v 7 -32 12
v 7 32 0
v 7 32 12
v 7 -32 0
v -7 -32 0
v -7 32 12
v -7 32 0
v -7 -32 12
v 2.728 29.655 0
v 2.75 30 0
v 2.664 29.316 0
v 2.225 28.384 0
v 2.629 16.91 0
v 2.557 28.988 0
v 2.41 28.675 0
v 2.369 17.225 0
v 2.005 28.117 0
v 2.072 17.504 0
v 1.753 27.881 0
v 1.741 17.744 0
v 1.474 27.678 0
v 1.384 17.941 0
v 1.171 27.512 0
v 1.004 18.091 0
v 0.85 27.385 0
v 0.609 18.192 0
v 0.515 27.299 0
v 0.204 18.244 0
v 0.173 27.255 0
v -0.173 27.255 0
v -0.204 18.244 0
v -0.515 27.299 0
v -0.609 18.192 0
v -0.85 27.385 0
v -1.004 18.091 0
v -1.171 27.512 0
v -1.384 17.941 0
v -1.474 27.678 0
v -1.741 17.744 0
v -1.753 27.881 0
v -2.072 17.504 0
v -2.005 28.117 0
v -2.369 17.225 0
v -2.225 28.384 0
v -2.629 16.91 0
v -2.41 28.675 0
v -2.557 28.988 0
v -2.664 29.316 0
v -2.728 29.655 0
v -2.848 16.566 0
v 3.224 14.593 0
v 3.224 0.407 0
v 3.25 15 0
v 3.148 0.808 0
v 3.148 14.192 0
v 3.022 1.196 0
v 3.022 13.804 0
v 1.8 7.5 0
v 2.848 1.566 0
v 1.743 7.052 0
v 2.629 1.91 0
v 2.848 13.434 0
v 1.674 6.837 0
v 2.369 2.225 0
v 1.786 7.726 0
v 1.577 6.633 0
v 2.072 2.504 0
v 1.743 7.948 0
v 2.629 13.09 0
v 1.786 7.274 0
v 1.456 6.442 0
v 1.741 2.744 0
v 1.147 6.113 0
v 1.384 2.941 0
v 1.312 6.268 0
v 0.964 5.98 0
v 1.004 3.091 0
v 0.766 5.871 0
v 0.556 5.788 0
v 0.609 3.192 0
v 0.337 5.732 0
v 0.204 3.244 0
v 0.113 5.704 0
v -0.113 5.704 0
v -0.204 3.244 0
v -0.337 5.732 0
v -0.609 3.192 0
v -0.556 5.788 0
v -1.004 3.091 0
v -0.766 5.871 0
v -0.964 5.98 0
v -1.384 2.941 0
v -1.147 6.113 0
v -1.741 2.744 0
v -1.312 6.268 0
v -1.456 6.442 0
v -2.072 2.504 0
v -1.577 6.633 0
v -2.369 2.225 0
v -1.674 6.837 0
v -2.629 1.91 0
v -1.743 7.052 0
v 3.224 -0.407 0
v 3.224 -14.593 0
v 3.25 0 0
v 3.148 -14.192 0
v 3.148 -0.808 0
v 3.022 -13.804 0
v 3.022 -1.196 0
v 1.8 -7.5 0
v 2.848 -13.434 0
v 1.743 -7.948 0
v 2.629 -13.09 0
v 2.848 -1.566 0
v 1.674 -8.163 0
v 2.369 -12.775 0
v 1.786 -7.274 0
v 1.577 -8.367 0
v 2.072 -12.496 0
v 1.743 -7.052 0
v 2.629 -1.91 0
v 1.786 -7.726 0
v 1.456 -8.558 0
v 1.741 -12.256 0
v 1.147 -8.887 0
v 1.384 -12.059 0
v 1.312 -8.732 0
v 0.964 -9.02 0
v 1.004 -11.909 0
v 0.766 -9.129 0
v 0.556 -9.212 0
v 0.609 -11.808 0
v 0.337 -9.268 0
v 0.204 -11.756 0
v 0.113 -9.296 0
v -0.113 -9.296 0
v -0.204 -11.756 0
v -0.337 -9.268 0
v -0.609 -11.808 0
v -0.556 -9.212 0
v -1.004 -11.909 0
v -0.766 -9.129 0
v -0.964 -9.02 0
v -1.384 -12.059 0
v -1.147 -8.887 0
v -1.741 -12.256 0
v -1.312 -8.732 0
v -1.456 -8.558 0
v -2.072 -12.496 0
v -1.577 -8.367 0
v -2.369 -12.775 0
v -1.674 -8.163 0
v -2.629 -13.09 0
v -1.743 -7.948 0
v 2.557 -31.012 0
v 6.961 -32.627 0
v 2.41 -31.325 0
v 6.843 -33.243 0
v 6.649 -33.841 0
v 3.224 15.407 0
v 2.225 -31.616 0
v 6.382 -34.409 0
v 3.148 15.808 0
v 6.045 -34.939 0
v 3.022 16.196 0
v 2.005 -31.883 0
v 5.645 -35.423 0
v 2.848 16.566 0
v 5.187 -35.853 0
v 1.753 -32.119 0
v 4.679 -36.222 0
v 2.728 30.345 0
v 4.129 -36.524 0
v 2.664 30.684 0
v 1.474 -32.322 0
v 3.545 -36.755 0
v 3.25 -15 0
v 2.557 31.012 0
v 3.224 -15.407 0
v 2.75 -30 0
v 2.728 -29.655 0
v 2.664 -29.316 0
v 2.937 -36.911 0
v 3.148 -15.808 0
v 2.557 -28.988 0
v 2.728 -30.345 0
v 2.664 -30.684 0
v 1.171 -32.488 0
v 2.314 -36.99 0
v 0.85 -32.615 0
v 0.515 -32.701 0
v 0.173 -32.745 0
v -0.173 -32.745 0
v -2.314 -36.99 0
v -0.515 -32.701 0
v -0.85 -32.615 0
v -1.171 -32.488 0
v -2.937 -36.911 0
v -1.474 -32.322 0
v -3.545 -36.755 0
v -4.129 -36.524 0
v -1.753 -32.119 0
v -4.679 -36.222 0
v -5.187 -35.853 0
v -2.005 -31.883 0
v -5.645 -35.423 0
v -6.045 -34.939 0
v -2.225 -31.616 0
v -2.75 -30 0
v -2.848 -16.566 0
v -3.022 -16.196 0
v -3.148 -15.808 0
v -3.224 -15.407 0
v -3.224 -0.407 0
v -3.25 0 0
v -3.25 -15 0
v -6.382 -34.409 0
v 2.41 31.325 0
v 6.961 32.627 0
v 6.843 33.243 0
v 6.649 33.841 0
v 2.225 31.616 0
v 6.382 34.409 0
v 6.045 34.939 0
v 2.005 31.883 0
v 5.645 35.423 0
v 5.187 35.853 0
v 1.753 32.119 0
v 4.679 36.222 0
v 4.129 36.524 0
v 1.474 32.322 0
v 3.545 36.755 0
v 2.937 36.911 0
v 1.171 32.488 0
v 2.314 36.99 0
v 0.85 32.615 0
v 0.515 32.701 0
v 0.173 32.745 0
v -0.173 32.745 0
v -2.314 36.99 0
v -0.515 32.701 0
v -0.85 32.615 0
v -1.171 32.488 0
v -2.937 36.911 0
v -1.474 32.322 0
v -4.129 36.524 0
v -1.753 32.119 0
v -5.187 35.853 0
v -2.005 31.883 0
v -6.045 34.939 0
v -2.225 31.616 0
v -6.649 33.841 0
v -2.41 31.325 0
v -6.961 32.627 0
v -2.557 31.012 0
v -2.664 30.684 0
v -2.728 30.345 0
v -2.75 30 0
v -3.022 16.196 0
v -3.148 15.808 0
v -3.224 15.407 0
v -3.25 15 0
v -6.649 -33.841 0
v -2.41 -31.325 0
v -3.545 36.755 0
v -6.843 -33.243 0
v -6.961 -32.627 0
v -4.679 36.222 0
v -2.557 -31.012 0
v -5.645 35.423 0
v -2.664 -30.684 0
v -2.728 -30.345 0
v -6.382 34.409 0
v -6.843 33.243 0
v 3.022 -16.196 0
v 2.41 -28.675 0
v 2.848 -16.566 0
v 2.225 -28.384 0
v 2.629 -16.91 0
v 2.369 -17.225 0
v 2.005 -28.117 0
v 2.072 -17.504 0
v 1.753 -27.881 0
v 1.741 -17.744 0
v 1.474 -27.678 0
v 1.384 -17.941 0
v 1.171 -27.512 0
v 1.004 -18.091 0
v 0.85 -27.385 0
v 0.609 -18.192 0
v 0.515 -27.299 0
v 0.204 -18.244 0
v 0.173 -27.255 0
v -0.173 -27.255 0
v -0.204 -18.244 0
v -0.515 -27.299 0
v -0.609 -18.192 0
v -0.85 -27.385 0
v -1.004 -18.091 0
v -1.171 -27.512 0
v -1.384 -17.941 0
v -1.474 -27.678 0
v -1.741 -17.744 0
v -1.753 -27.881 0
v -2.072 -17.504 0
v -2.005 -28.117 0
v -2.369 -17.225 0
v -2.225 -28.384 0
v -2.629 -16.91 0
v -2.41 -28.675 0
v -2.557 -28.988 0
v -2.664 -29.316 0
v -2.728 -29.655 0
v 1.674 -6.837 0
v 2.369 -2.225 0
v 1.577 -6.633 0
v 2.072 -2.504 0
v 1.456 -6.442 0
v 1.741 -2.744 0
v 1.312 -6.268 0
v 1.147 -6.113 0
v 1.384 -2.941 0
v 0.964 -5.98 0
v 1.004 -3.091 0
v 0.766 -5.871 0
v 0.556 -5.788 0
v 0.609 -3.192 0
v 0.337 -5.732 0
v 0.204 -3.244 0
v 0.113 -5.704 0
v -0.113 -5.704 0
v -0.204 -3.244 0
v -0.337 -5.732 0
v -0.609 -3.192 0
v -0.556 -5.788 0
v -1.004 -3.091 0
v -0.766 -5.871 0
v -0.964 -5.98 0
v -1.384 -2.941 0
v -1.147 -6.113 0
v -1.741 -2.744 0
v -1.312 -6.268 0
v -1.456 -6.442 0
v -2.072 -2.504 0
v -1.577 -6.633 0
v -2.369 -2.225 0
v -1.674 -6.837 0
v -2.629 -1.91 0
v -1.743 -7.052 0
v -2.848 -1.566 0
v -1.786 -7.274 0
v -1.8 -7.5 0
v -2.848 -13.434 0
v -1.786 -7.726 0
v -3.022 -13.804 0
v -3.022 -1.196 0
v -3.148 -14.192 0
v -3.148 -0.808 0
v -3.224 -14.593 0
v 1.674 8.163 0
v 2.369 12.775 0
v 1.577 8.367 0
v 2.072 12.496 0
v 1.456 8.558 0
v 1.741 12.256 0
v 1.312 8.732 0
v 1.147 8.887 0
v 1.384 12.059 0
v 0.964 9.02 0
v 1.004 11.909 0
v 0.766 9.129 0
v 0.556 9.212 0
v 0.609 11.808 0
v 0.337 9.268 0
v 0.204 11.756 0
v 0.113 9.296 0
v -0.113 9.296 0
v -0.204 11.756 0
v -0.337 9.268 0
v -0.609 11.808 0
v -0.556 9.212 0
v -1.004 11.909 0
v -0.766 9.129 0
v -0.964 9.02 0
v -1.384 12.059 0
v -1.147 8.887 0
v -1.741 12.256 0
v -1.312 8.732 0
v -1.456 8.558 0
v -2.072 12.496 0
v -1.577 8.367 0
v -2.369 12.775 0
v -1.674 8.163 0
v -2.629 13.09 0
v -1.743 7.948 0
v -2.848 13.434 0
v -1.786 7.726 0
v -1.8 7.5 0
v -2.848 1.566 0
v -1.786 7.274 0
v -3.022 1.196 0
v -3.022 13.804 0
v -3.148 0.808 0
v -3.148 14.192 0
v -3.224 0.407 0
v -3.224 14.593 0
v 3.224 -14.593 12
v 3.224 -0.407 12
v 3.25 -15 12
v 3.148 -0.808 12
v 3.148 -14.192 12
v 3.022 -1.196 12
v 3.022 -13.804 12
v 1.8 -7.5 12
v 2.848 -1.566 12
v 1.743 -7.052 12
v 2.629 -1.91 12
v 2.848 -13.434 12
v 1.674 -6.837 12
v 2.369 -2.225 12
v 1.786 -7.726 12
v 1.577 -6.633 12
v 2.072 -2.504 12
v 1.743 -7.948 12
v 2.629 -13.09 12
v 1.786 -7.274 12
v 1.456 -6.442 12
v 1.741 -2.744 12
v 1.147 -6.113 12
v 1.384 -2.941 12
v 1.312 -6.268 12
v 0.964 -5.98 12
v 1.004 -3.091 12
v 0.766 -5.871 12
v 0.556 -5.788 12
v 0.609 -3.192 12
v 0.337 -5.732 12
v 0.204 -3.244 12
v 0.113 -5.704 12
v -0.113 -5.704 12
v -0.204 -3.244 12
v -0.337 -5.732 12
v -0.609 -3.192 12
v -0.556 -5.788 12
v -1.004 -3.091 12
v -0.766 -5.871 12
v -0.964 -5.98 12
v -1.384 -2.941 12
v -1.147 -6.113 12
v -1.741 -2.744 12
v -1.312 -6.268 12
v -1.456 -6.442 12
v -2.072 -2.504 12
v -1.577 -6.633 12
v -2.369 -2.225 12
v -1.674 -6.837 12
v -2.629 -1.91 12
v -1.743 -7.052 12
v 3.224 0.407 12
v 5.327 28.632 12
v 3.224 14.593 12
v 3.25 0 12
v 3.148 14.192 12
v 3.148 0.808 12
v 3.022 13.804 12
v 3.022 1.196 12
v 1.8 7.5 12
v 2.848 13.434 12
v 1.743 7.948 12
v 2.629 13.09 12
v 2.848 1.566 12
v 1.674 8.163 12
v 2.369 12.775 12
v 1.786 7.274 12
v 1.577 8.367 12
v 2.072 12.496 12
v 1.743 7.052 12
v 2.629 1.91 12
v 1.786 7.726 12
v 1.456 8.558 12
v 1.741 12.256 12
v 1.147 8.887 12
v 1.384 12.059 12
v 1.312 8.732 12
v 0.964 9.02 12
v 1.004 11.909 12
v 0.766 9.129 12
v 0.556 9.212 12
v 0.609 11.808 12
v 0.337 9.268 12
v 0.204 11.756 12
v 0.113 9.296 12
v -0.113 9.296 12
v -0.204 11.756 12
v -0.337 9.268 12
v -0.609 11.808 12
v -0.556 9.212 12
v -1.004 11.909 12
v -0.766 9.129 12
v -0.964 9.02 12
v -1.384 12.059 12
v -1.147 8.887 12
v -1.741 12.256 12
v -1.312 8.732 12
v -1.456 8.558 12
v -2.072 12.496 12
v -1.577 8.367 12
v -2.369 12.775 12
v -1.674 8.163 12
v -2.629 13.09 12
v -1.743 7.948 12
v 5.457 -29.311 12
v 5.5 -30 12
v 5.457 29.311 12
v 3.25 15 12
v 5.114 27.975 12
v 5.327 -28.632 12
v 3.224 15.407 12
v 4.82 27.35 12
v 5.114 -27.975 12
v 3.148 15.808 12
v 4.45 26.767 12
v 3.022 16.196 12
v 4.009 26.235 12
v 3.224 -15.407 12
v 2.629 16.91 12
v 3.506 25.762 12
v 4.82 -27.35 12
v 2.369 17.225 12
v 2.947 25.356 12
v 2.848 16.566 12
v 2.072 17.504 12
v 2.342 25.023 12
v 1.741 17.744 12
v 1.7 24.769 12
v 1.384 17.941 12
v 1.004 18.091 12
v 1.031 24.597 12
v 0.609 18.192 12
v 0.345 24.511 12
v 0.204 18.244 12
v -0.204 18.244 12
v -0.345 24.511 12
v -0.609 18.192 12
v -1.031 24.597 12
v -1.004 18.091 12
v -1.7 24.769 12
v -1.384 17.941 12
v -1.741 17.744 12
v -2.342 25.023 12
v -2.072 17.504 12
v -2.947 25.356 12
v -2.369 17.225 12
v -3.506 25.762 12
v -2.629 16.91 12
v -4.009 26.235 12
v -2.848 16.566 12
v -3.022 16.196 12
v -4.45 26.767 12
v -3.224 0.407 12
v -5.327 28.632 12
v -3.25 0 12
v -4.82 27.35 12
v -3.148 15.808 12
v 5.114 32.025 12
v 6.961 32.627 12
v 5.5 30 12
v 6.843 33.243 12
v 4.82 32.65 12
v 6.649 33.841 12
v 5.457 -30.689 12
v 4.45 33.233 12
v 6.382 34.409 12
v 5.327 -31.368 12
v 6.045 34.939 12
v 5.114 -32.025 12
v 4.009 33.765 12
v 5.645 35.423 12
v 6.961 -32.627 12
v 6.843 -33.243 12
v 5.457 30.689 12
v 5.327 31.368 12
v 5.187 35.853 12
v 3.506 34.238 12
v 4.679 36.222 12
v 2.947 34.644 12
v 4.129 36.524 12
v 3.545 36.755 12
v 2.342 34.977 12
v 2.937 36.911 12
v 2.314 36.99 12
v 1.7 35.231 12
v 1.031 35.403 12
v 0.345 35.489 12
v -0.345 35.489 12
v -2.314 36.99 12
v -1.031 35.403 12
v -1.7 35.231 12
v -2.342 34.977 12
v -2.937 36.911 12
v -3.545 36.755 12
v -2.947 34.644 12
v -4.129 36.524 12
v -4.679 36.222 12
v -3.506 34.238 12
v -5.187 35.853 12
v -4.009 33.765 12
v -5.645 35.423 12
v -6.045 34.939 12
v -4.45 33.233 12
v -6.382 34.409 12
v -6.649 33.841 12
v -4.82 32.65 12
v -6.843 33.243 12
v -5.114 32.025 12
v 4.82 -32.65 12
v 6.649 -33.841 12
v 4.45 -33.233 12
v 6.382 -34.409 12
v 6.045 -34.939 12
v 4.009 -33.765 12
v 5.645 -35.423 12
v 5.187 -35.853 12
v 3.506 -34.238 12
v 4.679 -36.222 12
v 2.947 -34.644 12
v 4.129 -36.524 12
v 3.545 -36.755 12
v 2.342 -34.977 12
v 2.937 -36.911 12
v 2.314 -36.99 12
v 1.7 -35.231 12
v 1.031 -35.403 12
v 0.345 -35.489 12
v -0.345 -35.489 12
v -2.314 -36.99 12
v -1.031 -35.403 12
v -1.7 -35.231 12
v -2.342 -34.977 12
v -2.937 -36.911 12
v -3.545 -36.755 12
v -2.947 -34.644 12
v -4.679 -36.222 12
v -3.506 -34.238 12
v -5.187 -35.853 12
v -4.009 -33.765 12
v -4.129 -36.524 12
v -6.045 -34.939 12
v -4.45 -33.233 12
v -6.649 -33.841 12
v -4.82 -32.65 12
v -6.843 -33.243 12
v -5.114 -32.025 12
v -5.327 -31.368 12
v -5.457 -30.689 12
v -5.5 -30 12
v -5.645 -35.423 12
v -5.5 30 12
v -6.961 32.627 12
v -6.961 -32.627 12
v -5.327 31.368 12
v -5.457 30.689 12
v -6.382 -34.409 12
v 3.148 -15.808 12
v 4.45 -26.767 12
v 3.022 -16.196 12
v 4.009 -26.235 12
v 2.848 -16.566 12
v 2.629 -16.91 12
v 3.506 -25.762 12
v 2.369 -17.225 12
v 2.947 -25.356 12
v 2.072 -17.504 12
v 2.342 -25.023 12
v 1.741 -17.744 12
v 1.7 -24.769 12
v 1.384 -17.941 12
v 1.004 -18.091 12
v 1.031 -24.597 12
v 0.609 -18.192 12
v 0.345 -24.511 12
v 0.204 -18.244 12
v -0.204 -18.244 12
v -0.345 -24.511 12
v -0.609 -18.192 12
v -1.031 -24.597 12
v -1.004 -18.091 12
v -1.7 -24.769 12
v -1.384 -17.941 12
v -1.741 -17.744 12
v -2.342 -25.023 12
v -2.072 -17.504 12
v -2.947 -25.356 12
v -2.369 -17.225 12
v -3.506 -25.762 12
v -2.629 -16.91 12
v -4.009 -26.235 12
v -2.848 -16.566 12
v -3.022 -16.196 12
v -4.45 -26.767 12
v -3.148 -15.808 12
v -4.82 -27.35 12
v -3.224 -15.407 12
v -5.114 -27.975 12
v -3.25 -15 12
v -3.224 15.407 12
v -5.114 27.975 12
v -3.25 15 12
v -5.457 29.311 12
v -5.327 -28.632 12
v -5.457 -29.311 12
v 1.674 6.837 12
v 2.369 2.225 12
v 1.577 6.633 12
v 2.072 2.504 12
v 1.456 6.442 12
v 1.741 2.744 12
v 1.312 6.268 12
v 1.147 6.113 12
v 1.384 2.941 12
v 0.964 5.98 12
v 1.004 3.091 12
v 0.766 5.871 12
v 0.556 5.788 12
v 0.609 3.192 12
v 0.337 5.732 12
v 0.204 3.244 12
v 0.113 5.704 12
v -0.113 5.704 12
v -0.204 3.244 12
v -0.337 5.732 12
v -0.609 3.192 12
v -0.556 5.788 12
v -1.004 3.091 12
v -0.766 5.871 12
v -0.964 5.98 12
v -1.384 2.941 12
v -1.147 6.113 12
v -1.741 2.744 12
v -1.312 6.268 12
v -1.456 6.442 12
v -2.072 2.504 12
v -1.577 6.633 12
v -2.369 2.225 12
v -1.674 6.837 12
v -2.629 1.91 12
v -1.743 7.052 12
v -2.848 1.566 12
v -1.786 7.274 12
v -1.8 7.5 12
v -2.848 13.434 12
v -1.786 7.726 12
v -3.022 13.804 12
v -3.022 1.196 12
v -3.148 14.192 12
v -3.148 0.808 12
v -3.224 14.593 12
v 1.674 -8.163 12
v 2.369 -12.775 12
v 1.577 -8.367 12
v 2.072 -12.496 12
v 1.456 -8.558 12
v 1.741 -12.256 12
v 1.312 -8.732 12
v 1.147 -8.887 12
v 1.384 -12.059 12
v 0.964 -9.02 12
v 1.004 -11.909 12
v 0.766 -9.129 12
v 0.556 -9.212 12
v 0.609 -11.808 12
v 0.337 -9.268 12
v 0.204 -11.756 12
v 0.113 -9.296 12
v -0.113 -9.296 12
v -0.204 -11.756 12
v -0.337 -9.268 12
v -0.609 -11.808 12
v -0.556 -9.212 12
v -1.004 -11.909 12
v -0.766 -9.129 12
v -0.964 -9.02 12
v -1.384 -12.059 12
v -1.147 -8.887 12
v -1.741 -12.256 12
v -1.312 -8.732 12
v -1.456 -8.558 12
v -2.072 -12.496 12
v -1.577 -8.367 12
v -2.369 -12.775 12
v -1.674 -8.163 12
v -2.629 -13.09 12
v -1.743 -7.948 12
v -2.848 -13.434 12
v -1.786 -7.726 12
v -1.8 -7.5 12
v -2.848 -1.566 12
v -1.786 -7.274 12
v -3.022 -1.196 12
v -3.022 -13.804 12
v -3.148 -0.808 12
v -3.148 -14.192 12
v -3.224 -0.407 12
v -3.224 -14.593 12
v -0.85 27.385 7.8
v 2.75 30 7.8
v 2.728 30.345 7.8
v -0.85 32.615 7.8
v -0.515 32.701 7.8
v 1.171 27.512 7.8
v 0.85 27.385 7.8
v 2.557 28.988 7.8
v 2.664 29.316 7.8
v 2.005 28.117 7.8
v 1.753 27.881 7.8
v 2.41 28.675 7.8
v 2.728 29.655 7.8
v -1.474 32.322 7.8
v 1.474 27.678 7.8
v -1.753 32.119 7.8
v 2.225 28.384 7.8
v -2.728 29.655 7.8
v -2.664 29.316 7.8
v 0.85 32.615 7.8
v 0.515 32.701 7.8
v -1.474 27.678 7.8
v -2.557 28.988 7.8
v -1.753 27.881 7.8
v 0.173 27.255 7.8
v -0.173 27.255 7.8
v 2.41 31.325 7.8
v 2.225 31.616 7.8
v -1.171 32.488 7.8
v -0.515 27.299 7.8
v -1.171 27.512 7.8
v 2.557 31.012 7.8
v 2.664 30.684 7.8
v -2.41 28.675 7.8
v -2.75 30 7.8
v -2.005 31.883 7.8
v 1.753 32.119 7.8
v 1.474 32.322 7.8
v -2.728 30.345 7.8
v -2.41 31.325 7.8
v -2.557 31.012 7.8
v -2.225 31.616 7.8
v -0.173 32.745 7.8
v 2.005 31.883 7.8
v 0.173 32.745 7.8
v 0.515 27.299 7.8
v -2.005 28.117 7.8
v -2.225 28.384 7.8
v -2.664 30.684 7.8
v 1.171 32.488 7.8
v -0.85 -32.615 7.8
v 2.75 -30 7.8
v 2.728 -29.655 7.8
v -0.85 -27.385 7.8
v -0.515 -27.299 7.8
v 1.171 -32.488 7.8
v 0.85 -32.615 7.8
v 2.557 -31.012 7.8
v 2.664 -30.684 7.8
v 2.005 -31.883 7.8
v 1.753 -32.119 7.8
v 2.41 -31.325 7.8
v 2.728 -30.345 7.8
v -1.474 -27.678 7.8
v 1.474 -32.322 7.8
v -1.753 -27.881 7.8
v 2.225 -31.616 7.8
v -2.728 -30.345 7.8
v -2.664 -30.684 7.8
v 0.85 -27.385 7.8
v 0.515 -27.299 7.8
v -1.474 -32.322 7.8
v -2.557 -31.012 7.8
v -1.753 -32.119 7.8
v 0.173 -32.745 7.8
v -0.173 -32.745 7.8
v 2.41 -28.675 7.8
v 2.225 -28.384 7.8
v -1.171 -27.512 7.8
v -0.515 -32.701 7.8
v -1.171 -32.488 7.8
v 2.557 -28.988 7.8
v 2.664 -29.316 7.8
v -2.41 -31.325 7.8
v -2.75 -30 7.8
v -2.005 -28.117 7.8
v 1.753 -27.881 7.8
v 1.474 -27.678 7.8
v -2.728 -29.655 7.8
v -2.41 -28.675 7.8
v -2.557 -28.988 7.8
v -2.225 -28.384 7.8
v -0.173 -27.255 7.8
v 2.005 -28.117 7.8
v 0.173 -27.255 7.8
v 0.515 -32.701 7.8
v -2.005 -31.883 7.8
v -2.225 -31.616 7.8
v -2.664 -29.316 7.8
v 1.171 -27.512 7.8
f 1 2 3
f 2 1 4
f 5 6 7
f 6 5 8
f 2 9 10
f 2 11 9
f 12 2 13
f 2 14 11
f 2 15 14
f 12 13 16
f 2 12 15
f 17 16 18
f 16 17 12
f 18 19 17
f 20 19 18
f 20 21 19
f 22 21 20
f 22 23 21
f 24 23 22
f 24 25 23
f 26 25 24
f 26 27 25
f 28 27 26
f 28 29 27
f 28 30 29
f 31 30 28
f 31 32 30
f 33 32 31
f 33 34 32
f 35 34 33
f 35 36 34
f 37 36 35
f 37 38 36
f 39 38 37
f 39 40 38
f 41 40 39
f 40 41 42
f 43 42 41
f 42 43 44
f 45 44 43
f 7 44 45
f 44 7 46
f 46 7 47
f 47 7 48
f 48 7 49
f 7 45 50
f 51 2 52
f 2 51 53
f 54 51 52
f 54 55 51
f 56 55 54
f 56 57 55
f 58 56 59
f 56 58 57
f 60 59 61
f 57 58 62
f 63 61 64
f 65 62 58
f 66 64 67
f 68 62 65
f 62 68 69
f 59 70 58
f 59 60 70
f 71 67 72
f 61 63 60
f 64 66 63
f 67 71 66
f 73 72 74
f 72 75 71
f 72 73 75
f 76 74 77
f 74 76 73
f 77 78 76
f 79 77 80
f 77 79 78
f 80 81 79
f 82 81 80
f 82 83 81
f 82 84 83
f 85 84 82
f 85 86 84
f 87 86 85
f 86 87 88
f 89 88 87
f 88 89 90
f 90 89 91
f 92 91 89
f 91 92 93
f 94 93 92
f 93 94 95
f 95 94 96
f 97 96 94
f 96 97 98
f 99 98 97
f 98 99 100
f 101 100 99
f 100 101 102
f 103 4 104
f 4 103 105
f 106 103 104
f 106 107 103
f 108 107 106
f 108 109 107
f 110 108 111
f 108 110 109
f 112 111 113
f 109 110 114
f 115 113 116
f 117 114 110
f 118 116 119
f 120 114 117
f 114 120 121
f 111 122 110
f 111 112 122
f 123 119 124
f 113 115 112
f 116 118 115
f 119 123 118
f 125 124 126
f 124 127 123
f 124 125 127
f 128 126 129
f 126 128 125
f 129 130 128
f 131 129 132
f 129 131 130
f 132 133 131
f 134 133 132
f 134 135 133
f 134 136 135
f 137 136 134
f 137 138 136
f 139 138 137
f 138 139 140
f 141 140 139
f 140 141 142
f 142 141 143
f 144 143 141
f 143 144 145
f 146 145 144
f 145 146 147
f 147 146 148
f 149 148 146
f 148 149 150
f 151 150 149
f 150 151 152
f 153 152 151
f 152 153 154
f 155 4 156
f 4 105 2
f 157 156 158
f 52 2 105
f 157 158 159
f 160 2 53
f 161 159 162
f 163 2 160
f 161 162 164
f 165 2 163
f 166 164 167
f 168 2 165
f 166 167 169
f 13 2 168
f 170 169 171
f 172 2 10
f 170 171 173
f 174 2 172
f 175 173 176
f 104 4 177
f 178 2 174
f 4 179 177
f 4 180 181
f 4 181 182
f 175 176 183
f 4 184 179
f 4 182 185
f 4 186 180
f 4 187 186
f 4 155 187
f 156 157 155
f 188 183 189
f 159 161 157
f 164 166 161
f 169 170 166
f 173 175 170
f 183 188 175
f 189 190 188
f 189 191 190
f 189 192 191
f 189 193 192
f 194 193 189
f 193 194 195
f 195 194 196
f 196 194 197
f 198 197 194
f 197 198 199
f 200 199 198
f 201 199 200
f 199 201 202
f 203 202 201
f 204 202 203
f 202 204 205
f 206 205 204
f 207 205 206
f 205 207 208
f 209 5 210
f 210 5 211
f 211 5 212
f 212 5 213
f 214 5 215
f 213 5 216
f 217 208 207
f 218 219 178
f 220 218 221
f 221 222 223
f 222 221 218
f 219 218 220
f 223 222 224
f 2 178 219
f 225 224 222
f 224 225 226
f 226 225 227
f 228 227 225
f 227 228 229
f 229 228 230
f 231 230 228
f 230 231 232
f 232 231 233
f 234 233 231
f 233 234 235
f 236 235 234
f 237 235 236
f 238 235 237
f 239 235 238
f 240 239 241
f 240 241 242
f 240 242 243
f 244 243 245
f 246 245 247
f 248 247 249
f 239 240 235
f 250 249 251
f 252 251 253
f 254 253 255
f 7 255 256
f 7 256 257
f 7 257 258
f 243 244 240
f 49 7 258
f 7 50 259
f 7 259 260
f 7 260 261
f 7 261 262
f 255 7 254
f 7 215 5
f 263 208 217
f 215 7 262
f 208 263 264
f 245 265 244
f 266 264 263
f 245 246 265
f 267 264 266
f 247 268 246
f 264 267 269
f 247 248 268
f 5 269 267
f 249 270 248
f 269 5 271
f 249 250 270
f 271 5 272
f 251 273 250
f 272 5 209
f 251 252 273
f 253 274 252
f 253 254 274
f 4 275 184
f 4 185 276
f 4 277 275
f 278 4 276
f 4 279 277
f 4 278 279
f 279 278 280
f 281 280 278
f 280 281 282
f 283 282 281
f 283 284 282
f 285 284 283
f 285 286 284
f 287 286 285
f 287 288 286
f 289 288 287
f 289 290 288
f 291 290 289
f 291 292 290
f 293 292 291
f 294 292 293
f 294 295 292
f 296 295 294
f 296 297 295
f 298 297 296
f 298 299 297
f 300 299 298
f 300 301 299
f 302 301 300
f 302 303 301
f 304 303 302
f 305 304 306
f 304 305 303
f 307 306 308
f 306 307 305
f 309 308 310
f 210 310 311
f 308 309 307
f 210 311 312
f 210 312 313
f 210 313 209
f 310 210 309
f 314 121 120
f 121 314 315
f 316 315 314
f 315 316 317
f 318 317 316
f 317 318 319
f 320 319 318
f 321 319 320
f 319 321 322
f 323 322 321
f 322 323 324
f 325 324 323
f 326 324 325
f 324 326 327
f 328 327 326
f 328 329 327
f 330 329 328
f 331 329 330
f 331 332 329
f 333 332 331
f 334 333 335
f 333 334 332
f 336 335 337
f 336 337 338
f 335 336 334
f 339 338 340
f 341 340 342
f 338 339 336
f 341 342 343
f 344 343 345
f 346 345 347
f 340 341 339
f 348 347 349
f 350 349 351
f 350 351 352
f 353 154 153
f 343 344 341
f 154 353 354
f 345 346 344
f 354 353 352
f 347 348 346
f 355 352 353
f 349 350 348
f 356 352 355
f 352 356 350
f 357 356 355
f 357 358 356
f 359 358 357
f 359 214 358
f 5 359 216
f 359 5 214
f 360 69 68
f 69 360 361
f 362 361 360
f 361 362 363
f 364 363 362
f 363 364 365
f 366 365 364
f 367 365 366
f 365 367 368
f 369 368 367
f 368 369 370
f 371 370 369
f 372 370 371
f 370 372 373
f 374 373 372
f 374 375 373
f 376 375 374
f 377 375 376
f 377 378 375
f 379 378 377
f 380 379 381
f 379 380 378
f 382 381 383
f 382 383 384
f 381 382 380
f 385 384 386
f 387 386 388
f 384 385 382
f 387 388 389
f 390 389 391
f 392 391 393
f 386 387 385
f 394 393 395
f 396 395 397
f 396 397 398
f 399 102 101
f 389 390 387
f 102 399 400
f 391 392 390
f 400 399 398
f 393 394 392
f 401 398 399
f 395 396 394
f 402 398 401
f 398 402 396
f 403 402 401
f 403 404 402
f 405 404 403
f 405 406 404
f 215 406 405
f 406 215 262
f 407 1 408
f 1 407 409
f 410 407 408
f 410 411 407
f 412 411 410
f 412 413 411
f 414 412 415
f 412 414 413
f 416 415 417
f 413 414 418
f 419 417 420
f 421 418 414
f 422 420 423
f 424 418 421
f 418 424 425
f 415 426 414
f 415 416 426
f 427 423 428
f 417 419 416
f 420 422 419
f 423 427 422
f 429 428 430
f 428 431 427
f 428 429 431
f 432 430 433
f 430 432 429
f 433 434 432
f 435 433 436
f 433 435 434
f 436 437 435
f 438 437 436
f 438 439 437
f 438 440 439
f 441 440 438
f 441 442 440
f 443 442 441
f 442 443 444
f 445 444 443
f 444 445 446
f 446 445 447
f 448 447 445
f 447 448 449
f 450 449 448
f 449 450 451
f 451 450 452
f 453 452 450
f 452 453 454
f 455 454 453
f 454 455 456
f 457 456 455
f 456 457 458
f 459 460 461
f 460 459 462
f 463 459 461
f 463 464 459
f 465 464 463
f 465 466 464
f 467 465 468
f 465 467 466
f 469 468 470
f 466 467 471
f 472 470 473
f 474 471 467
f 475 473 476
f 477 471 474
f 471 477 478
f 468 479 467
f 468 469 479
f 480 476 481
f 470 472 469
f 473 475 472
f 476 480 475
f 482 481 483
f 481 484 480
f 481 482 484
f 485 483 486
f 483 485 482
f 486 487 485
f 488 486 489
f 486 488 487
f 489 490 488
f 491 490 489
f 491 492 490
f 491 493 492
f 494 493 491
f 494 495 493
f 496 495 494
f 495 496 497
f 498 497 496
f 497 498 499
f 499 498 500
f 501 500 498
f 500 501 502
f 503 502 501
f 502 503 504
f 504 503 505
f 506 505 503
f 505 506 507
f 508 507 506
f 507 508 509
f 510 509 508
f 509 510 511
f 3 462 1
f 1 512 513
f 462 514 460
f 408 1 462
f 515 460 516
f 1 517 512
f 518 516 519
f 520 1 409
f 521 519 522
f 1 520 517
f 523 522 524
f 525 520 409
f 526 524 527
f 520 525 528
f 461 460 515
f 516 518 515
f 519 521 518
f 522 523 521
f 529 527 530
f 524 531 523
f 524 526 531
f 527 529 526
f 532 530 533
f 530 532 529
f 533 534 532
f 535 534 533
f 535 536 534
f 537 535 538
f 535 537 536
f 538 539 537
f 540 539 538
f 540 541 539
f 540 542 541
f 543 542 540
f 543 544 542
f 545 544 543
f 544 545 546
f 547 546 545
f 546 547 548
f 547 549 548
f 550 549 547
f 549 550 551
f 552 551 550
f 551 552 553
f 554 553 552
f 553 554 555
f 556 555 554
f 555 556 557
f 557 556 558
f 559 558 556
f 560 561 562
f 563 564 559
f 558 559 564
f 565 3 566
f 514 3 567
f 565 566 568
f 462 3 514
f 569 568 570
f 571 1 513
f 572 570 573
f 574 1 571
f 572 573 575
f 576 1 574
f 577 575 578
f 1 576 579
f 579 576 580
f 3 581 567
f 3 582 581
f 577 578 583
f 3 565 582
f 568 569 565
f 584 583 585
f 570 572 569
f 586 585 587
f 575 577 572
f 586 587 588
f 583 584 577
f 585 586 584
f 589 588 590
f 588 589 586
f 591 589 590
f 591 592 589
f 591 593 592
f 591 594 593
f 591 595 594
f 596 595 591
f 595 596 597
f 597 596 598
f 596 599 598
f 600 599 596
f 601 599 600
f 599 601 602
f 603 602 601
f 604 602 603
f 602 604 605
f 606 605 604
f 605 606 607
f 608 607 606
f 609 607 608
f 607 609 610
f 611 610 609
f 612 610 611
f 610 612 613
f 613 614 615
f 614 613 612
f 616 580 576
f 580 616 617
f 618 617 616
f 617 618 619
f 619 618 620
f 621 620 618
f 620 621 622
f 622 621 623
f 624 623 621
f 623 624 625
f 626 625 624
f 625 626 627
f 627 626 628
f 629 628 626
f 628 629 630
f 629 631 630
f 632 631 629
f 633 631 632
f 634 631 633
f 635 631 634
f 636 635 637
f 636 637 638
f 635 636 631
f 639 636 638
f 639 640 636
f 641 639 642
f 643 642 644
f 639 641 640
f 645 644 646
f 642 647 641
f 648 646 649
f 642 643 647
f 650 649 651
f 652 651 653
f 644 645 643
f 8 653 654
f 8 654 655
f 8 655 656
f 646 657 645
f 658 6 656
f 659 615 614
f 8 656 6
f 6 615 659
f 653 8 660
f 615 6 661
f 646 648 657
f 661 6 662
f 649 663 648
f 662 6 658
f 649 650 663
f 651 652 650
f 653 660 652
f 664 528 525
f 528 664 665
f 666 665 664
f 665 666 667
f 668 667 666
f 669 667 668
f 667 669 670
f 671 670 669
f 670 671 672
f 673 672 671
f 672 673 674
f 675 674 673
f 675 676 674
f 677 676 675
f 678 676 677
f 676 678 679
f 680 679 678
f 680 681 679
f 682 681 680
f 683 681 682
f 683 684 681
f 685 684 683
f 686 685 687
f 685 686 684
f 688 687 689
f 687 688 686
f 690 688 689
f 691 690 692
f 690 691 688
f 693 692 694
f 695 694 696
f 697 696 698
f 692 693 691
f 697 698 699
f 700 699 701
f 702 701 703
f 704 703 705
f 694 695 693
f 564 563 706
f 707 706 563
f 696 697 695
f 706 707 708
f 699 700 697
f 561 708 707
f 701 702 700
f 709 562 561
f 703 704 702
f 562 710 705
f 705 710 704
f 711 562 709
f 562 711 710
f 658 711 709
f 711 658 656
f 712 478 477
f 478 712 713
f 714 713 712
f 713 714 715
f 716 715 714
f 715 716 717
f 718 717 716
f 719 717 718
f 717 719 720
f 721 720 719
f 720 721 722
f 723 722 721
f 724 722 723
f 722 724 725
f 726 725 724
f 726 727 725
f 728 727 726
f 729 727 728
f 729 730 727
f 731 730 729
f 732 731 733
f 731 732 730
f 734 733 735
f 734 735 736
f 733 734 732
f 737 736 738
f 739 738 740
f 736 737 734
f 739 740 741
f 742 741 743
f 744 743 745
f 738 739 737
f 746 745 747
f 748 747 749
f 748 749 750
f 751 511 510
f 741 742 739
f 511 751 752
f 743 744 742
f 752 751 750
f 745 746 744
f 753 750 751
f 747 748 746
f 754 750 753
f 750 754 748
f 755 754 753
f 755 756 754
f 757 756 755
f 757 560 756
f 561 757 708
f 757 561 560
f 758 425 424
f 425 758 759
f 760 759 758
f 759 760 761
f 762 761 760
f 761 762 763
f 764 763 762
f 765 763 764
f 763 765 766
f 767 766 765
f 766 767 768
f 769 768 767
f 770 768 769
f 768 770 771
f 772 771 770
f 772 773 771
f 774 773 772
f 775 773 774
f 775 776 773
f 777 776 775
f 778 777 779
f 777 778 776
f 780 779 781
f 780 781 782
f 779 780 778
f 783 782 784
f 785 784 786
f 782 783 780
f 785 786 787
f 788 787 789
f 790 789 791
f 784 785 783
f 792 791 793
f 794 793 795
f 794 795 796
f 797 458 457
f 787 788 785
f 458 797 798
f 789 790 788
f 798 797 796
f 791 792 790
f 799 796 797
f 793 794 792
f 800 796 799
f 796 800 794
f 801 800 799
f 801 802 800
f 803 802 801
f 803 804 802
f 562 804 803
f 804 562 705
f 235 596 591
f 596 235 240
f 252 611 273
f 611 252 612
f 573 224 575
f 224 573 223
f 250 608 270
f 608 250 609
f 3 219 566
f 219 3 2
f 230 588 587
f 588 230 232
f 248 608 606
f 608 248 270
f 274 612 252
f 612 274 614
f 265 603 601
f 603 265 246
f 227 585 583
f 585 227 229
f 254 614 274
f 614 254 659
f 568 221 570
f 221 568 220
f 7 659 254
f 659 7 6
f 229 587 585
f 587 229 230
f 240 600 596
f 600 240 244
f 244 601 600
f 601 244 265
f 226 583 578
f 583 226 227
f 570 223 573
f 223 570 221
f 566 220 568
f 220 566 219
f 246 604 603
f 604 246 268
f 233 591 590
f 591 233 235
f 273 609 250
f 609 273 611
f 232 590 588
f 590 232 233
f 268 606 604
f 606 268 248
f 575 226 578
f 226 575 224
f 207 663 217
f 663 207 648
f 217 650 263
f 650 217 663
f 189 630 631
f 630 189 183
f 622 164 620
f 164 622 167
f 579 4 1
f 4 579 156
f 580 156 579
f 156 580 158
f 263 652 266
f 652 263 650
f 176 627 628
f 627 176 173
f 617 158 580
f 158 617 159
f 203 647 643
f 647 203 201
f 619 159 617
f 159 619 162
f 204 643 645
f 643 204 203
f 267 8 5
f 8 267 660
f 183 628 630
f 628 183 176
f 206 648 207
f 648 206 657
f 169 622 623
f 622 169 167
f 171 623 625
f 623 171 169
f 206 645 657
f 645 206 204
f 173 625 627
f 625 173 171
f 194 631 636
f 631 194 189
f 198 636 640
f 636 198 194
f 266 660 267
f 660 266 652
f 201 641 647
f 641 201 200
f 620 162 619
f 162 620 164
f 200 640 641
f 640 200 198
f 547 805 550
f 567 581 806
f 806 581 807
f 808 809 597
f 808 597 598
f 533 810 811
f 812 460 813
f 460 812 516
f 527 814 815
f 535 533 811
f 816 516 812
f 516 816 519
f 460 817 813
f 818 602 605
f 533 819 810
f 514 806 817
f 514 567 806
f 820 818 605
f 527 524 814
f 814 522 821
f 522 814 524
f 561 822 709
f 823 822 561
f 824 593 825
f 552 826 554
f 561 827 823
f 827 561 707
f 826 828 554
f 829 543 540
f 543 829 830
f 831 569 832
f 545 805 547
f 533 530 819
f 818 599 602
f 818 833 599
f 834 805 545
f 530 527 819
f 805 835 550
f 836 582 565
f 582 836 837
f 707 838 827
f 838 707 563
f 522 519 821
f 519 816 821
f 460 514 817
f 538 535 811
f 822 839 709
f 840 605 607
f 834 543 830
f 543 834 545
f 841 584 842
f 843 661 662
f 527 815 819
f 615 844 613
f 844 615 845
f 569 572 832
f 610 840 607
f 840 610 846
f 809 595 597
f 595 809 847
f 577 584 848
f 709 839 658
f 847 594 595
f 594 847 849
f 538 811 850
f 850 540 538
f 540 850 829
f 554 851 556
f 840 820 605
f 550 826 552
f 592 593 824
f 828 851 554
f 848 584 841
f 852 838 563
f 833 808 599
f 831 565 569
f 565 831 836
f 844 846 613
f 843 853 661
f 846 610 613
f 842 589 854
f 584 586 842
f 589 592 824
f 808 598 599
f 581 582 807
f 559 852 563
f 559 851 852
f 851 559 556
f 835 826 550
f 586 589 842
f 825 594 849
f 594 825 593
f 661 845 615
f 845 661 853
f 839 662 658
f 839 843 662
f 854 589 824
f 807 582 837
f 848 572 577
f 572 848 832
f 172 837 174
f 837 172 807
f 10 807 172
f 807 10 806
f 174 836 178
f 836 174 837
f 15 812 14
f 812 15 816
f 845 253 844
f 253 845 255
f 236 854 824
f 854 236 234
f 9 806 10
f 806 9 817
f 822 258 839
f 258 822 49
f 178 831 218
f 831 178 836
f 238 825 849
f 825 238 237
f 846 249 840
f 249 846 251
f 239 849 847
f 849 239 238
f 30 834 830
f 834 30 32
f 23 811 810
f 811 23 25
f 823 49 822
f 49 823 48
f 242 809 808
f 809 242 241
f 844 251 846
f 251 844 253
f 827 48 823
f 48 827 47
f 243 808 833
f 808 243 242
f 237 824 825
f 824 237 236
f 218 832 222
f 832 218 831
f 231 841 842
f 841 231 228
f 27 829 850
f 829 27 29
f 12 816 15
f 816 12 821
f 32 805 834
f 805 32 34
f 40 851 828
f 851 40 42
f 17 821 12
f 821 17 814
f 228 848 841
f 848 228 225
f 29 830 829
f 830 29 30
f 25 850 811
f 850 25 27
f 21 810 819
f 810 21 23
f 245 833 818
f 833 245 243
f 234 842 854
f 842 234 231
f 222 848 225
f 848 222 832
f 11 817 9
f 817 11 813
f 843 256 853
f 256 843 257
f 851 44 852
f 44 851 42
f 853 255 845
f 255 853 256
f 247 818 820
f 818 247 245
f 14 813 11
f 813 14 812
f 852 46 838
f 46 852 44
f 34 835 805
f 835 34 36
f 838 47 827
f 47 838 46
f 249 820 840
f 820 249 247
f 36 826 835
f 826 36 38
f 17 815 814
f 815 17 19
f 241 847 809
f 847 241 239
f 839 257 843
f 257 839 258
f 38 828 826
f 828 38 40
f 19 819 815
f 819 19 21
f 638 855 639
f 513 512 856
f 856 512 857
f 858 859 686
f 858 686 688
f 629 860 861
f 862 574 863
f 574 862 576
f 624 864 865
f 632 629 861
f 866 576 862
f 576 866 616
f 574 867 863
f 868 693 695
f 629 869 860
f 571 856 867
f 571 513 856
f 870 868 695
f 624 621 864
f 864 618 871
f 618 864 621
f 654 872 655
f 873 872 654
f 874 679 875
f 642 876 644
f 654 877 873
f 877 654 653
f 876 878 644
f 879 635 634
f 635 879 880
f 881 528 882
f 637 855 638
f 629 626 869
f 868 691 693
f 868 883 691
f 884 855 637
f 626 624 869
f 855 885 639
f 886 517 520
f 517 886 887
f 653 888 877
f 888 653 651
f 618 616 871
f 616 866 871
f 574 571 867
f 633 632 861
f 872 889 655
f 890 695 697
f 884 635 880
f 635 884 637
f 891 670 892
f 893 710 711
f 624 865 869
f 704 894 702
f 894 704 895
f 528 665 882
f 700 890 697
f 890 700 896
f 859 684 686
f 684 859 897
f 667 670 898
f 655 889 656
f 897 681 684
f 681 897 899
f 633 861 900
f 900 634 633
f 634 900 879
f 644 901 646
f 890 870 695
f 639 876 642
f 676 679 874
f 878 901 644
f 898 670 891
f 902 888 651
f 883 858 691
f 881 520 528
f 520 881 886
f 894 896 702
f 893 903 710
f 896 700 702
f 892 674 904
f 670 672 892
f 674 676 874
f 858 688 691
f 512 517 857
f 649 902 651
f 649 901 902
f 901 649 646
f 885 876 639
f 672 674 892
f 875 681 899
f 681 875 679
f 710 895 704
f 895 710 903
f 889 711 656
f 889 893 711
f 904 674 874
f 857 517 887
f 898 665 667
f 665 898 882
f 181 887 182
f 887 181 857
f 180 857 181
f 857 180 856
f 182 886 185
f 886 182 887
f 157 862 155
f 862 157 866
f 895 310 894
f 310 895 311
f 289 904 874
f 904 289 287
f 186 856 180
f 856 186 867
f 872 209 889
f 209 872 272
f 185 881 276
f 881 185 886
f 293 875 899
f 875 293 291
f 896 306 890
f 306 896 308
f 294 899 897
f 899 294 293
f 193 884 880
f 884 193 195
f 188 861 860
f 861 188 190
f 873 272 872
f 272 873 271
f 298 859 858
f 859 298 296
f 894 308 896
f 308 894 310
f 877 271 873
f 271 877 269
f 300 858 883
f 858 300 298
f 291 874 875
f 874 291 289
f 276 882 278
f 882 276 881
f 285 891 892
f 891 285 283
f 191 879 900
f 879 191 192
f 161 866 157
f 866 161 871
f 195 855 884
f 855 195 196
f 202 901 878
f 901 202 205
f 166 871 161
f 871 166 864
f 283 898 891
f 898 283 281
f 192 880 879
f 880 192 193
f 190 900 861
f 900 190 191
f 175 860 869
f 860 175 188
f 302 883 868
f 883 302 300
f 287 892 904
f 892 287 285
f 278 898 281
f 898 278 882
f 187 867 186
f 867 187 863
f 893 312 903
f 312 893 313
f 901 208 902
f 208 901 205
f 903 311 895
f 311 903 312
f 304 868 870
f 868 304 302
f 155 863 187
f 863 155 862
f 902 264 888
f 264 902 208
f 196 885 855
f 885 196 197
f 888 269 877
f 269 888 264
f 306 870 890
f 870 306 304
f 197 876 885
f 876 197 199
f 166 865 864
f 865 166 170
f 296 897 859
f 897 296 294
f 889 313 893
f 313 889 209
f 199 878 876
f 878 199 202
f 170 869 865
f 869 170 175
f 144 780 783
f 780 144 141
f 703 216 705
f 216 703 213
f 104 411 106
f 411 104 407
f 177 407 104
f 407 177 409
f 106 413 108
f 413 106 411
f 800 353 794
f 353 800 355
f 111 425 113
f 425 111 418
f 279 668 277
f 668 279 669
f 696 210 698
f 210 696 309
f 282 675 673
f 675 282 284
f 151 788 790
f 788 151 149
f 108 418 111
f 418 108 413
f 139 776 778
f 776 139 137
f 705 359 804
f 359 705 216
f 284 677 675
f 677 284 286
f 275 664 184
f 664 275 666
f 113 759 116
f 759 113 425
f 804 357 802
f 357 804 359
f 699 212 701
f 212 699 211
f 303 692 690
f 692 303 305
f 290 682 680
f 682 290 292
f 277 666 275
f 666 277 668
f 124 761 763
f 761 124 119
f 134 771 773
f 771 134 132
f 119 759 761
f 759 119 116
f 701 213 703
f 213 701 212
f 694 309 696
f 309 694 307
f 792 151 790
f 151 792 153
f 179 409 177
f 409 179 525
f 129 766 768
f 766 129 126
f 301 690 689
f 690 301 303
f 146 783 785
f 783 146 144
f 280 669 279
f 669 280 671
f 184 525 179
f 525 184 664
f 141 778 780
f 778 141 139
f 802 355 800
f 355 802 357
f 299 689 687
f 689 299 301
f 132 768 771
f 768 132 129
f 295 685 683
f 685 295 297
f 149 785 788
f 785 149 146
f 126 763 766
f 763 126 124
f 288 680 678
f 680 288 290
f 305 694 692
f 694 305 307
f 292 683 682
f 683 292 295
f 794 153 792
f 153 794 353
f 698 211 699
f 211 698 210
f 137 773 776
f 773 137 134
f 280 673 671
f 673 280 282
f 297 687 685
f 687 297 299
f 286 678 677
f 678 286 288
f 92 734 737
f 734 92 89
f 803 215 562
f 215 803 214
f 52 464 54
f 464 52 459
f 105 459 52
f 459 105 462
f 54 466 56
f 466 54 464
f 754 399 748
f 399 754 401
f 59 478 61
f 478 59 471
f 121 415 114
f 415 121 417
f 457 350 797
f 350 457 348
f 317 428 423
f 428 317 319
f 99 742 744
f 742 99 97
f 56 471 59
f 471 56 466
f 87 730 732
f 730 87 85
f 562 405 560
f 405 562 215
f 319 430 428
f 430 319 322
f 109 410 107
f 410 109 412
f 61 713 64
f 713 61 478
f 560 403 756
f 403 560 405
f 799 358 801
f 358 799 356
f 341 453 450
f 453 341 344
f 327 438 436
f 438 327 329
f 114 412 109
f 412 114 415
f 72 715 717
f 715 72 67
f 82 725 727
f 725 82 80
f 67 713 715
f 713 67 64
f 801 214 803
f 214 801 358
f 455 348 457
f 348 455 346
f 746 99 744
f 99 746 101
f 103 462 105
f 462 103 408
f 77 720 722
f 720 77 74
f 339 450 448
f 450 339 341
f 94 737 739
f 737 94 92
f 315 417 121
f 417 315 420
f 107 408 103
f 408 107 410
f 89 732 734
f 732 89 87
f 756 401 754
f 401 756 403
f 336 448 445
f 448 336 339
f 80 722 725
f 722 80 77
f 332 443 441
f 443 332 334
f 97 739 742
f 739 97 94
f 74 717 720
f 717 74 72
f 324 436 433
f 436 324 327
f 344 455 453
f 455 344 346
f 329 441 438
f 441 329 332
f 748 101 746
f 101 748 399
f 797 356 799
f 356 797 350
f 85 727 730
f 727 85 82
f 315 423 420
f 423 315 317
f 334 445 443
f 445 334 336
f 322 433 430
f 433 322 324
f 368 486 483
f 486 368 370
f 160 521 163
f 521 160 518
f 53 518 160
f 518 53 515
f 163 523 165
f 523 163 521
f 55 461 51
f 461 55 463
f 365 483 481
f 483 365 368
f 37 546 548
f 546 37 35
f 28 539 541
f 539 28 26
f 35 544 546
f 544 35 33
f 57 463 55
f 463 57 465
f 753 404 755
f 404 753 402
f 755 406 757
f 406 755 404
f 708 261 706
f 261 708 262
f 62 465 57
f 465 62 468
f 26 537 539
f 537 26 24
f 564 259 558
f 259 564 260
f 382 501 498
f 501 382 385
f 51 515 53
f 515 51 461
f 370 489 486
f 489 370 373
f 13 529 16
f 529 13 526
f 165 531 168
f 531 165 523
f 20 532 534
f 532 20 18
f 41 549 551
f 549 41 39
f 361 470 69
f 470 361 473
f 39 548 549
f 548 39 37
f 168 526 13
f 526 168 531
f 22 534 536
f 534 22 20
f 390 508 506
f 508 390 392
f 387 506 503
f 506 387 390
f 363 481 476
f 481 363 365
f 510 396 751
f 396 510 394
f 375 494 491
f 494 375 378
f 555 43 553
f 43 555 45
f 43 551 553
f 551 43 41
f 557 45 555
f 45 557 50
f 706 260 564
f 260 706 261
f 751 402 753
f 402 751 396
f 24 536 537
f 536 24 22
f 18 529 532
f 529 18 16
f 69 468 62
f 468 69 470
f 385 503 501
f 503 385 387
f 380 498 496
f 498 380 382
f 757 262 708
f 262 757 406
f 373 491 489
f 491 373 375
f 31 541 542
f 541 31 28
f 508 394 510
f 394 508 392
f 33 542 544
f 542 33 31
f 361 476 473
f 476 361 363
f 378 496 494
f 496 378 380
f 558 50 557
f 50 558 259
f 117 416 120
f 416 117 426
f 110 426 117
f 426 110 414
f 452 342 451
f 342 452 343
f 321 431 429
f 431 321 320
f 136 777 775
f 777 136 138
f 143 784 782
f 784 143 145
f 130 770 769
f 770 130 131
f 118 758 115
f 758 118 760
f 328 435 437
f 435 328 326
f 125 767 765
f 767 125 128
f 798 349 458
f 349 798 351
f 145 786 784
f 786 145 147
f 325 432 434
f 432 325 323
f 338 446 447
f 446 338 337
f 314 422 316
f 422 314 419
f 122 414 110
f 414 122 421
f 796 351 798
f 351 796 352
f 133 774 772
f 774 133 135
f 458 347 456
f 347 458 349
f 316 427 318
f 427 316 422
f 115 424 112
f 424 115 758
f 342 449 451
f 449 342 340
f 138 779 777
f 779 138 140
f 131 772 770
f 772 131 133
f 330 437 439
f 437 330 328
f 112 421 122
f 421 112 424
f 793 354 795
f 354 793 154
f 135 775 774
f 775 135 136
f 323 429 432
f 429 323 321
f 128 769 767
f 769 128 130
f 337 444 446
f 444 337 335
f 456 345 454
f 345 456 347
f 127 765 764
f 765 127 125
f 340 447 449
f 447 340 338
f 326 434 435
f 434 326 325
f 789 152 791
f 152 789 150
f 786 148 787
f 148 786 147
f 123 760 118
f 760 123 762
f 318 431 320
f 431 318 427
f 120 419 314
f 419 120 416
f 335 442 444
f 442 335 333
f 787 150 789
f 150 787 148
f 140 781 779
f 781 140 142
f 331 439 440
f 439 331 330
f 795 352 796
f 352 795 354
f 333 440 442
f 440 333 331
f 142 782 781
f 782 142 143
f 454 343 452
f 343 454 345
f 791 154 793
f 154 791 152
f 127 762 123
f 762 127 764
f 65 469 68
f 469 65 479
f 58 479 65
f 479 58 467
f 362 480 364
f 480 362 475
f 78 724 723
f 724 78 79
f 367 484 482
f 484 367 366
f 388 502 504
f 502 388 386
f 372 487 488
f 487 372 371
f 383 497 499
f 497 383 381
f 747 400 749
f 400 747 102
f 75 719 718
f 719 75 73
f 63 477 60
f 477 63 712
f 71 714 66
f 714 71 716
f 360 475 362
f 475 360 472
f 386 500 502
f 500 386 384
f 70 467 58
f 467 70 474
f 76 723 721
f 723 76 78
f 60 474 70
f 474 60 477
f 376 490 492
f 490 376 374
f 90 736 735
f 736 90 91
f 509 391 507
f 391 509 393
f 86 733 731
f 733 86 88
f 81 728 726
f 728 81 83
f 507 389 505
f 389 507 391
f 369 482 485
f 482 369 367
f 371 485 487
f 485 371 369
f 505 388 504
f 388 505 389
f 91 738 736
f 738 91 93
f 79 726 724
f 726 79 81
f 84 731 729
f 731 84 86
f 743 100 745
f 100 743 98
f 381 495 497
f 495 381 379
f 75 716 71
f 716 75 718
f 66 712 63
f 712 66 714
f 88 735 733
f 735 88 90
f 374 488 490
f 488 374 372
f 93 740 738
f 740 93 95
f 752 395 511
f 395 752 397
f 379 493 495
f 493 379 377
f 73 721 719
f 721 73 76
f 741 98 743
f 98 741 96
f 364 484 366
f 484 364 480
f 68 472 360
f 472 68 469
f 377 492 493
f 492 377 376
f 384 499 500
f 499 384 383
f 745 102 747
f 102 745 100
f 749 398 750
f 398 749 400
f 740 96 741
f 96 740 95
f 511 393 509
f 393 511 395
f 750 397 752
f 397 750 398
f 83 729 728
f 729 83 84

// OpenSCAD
$fn = 50;


difference() {
	union() {
		hull() {
			translate(v = [-2.0000000000, 17.0000000000, 0]) {
				cylinder(h = 12, r = 5);
			}
			translate(v = [2.0000000000, 17.0000000000, 0]) {
				cylinder(h = 12, r = 5);
			}
			translate(v = [-2.0000000000, -17.0000000000, 0]) {
				cylinder(h = 12, r = 5);
			}
			translate(v = [2.0000000000, -17.0000000000, 0]) {
				cylinder(h = 12, r = 5);
			}
		}
		translate(v = [0.0000000000, 22.5000000000, 0]) {
			hull() {
				translate(v = [-2.0000000000, 9.5000000000, 0]) {
					cylinder(h = 12, r = 5);
				}
				translate(v = [2.0000000000, 9.5000000000, 0]) {
					cylinder(h = 12, r = 5);
				}
				translate(v = [-2.0000000000, -9.5000000000, 0]) {
					cylinder(h = 12, r = 5);
				}
				translate(v = [2.0000000000, -9.5000000000, 0]) {
					cylinder(h = 12, r = 5);
				}
			}
		}
		translate(v = [0.0000000000, 22.5000000000, 0]) {
			hull() {
				translate(v = [-2.0000000000, 9.5000000000, 0]) {
					cylinder(h = 12, r = 5);
				}
				translate(v = [2.0000000000, 9.5000000000, 0]) {
					cylinder(h = 12, r = 5);
				}
				translate(v = [-2.0000000000, -9.5000000000, 0]) {
					cylinder(h = 12, r = 5);
				}
				translate(v = [2.0000000000, -9.5000000000, 0]) {
					cylinder(h = 12, r = 5);
				}
			}
		}
		translate(v = [0.0000000000, -22.5000000000, 0]) {
			hull() {
				translate(v = [-2.0000000000, 9.5000000000, 0]) {
					cylinder(h = 12, r = 5);
				}
				translate(v = [2.0000000000, 9.5000000000, 0]) {
					cylinder(h = 12, r = 5);
				}
				translate(v = [-2.0000000000, -9.5000000000, 0]) {
					cylinder(h = 12, r = 5);
				}
				translate(v = [2.0000000000, -9.5000000000, 0]) {
					cylinder(h = 12, r = 5);
				}
			}
		}
		translate(v = [0.0000000000, -22.5000000000, 0]) {
			hull() {
				translate(v = [-2.0000000000, 9.5000000000, 0]) {
					cylinder(h = 12, r = 5);
				}
				translate(v = [2.0000000000, 9.5000000000, 0]) {
					cylinder(h = 12, r = 5);
				}
				translate(v = [-2.0000000000, -9.5000000000, 0]) {
					cylinder(h = 12, r = 5);
				}
				translate(v = [2.0000000000, -9.5000000000, 0]) {
					cylinder(h = 12, r = 5);
				}
			}
		}
	}
	union() {
		translate(v = [0.0000000000, 30.0000000000, 12]) {
			rotate(a = [0, 0, 0]) {
				difference() {
					union() {
						#translate(v = [0, 0, -12.0000000000]) {
							cylinder(h = 12, r = 2.2500000000);
						}
						#translate(v = [0, 0, -4.2000000000]) {
							cylinder(h = 4.2000000000, r1 = 2.7500000000, r2 = 5.5000000000);
						}
						#translate(v = [0, 0, -12.0000000000]) {
							cylinder(h = 12, r = 2.7500000000);
						}
						#translate(v = [0, 0, -12.0000000000]) {
							cylinder(h = 12, r = 2.2500000000);
						}
					}
					union();
				}
			}
		}
		translate(v = [0.0000000000, 30.0000000000, 12]) {
			rotate(a = [0, 0, 0]) {
				difference() {
					union() {
						#translate(v = [0, 0, -12.0000000000]) {
							cylinder(h = 12, r = 2.2500000000);
						}
						#translate(v = [0, 0, -4.2000000000]) {
							cylinder(h = 4.2000000000, r1 = 2.7500000000, r2 = 5.5000000000);
						}
						#translate(v = [0, 0, -12.0000000000]) {
							cylinder(h = 12, r = 2.7500000000);
						}
						#translate(v = [0, 0, -12.0000000000]) {
							cylinder(h = 12, r = 2.2500000000);
						}
					}
					union();
				}
			}
		}
		translate(v = [0.0000000000, -30.0000000000, 12]) {
			rotate(a = [0, 0, 0]) {
				difference() {
					union() {
						#translate(v = [0, 0, -12.0000000000]) {
							cylinder(h = 12, r = 2.2500000000);
						}
						#translate(v = [0, 0, -4.2000000000]) {
							cylinder(h = 4.2000000000, r1 = 2.7500000000, r2 = 5.5000000000);
						}
						#translate(v = [0, 0, -12.0000000000]) {
							cylinder(h = 12, r = 2.7500000000);
						}
						#translate(v = [0, 0, -12.0000000000]) {
							cylinder(h = 12, r = 2.2500000000);
						}
					}
					union();
				}
			}
		}
		translate(v = [0.0000000000, -30.0000000000, 12]) {
			rotate(a = [0, 0, 0]) {
				difference() {
					union() {
						#translate(v = [0, 0, -12.0000000000]) {
							cylinder(h = 12, r = 2.2500000000);
						}
						#translate(v = [0, 0, -4.2000000000]) {
							cylinder(h = 4.2000000000, r1 = 2.7500000000, r2 = 5.5000000000);
						}
						#translate(v = [0, 0, -12.0000000000]) {
							cylinder(h = 12, r = 2.7500000000);
						}
						#translate(v = [0, 0, -12.0000000000]) {
							cylinder(h = 12, r = 2.2500000000);
						}
					}
					union();
				}
			}
		}
		translate(v = [0.0000000000, -15.0000000000, 0]) {
			translate(v = [0, 0, -100]) {
				cylinder(h = 200, r = 3.2500000000);
			}
		}
		translate(v = [0, 0, -100]) {
			cylinder(h = 200, r = 3.2500000000);
		}
		translate(v = [0.0000000000, 15.0000000000, 0]) {
			translate(v = [0, 0, -100]) {
				cylinder(h = 200, r = 3.2500000000);
			}
		}
		translate(v = [0.0000000000, -15.0000000000, 0]) {
			translate(v = [0, 0, -100]) {
				cylinder(h = 200, r = 1.8000000000);
			}
		}
		translate(v = [0.0000000000, -7.5000000000, 0]) {
			translate(v = [0, 0, -100]) {
				cylinder(h = 200, r = 1.8000000000);
			}
		}
		translate(v = [0, 0, -100]) {
			cylinder(h = 200, r = 1.8000000000);
		}
		translate(v = [0.0000000000, 7.5000000000, 0]) {
			translate(v = [0, 0, -100]) {
				cylinder(h = 200, r = 1.8000000000);
			}
		}
		translate(v = [0.0000000000, 15.0000000000, 0]) {
			translate(v = [0, 0, -100]) {
				cylinder(h = 200, r = 1.8000000000);
			}
		}
	}
}
